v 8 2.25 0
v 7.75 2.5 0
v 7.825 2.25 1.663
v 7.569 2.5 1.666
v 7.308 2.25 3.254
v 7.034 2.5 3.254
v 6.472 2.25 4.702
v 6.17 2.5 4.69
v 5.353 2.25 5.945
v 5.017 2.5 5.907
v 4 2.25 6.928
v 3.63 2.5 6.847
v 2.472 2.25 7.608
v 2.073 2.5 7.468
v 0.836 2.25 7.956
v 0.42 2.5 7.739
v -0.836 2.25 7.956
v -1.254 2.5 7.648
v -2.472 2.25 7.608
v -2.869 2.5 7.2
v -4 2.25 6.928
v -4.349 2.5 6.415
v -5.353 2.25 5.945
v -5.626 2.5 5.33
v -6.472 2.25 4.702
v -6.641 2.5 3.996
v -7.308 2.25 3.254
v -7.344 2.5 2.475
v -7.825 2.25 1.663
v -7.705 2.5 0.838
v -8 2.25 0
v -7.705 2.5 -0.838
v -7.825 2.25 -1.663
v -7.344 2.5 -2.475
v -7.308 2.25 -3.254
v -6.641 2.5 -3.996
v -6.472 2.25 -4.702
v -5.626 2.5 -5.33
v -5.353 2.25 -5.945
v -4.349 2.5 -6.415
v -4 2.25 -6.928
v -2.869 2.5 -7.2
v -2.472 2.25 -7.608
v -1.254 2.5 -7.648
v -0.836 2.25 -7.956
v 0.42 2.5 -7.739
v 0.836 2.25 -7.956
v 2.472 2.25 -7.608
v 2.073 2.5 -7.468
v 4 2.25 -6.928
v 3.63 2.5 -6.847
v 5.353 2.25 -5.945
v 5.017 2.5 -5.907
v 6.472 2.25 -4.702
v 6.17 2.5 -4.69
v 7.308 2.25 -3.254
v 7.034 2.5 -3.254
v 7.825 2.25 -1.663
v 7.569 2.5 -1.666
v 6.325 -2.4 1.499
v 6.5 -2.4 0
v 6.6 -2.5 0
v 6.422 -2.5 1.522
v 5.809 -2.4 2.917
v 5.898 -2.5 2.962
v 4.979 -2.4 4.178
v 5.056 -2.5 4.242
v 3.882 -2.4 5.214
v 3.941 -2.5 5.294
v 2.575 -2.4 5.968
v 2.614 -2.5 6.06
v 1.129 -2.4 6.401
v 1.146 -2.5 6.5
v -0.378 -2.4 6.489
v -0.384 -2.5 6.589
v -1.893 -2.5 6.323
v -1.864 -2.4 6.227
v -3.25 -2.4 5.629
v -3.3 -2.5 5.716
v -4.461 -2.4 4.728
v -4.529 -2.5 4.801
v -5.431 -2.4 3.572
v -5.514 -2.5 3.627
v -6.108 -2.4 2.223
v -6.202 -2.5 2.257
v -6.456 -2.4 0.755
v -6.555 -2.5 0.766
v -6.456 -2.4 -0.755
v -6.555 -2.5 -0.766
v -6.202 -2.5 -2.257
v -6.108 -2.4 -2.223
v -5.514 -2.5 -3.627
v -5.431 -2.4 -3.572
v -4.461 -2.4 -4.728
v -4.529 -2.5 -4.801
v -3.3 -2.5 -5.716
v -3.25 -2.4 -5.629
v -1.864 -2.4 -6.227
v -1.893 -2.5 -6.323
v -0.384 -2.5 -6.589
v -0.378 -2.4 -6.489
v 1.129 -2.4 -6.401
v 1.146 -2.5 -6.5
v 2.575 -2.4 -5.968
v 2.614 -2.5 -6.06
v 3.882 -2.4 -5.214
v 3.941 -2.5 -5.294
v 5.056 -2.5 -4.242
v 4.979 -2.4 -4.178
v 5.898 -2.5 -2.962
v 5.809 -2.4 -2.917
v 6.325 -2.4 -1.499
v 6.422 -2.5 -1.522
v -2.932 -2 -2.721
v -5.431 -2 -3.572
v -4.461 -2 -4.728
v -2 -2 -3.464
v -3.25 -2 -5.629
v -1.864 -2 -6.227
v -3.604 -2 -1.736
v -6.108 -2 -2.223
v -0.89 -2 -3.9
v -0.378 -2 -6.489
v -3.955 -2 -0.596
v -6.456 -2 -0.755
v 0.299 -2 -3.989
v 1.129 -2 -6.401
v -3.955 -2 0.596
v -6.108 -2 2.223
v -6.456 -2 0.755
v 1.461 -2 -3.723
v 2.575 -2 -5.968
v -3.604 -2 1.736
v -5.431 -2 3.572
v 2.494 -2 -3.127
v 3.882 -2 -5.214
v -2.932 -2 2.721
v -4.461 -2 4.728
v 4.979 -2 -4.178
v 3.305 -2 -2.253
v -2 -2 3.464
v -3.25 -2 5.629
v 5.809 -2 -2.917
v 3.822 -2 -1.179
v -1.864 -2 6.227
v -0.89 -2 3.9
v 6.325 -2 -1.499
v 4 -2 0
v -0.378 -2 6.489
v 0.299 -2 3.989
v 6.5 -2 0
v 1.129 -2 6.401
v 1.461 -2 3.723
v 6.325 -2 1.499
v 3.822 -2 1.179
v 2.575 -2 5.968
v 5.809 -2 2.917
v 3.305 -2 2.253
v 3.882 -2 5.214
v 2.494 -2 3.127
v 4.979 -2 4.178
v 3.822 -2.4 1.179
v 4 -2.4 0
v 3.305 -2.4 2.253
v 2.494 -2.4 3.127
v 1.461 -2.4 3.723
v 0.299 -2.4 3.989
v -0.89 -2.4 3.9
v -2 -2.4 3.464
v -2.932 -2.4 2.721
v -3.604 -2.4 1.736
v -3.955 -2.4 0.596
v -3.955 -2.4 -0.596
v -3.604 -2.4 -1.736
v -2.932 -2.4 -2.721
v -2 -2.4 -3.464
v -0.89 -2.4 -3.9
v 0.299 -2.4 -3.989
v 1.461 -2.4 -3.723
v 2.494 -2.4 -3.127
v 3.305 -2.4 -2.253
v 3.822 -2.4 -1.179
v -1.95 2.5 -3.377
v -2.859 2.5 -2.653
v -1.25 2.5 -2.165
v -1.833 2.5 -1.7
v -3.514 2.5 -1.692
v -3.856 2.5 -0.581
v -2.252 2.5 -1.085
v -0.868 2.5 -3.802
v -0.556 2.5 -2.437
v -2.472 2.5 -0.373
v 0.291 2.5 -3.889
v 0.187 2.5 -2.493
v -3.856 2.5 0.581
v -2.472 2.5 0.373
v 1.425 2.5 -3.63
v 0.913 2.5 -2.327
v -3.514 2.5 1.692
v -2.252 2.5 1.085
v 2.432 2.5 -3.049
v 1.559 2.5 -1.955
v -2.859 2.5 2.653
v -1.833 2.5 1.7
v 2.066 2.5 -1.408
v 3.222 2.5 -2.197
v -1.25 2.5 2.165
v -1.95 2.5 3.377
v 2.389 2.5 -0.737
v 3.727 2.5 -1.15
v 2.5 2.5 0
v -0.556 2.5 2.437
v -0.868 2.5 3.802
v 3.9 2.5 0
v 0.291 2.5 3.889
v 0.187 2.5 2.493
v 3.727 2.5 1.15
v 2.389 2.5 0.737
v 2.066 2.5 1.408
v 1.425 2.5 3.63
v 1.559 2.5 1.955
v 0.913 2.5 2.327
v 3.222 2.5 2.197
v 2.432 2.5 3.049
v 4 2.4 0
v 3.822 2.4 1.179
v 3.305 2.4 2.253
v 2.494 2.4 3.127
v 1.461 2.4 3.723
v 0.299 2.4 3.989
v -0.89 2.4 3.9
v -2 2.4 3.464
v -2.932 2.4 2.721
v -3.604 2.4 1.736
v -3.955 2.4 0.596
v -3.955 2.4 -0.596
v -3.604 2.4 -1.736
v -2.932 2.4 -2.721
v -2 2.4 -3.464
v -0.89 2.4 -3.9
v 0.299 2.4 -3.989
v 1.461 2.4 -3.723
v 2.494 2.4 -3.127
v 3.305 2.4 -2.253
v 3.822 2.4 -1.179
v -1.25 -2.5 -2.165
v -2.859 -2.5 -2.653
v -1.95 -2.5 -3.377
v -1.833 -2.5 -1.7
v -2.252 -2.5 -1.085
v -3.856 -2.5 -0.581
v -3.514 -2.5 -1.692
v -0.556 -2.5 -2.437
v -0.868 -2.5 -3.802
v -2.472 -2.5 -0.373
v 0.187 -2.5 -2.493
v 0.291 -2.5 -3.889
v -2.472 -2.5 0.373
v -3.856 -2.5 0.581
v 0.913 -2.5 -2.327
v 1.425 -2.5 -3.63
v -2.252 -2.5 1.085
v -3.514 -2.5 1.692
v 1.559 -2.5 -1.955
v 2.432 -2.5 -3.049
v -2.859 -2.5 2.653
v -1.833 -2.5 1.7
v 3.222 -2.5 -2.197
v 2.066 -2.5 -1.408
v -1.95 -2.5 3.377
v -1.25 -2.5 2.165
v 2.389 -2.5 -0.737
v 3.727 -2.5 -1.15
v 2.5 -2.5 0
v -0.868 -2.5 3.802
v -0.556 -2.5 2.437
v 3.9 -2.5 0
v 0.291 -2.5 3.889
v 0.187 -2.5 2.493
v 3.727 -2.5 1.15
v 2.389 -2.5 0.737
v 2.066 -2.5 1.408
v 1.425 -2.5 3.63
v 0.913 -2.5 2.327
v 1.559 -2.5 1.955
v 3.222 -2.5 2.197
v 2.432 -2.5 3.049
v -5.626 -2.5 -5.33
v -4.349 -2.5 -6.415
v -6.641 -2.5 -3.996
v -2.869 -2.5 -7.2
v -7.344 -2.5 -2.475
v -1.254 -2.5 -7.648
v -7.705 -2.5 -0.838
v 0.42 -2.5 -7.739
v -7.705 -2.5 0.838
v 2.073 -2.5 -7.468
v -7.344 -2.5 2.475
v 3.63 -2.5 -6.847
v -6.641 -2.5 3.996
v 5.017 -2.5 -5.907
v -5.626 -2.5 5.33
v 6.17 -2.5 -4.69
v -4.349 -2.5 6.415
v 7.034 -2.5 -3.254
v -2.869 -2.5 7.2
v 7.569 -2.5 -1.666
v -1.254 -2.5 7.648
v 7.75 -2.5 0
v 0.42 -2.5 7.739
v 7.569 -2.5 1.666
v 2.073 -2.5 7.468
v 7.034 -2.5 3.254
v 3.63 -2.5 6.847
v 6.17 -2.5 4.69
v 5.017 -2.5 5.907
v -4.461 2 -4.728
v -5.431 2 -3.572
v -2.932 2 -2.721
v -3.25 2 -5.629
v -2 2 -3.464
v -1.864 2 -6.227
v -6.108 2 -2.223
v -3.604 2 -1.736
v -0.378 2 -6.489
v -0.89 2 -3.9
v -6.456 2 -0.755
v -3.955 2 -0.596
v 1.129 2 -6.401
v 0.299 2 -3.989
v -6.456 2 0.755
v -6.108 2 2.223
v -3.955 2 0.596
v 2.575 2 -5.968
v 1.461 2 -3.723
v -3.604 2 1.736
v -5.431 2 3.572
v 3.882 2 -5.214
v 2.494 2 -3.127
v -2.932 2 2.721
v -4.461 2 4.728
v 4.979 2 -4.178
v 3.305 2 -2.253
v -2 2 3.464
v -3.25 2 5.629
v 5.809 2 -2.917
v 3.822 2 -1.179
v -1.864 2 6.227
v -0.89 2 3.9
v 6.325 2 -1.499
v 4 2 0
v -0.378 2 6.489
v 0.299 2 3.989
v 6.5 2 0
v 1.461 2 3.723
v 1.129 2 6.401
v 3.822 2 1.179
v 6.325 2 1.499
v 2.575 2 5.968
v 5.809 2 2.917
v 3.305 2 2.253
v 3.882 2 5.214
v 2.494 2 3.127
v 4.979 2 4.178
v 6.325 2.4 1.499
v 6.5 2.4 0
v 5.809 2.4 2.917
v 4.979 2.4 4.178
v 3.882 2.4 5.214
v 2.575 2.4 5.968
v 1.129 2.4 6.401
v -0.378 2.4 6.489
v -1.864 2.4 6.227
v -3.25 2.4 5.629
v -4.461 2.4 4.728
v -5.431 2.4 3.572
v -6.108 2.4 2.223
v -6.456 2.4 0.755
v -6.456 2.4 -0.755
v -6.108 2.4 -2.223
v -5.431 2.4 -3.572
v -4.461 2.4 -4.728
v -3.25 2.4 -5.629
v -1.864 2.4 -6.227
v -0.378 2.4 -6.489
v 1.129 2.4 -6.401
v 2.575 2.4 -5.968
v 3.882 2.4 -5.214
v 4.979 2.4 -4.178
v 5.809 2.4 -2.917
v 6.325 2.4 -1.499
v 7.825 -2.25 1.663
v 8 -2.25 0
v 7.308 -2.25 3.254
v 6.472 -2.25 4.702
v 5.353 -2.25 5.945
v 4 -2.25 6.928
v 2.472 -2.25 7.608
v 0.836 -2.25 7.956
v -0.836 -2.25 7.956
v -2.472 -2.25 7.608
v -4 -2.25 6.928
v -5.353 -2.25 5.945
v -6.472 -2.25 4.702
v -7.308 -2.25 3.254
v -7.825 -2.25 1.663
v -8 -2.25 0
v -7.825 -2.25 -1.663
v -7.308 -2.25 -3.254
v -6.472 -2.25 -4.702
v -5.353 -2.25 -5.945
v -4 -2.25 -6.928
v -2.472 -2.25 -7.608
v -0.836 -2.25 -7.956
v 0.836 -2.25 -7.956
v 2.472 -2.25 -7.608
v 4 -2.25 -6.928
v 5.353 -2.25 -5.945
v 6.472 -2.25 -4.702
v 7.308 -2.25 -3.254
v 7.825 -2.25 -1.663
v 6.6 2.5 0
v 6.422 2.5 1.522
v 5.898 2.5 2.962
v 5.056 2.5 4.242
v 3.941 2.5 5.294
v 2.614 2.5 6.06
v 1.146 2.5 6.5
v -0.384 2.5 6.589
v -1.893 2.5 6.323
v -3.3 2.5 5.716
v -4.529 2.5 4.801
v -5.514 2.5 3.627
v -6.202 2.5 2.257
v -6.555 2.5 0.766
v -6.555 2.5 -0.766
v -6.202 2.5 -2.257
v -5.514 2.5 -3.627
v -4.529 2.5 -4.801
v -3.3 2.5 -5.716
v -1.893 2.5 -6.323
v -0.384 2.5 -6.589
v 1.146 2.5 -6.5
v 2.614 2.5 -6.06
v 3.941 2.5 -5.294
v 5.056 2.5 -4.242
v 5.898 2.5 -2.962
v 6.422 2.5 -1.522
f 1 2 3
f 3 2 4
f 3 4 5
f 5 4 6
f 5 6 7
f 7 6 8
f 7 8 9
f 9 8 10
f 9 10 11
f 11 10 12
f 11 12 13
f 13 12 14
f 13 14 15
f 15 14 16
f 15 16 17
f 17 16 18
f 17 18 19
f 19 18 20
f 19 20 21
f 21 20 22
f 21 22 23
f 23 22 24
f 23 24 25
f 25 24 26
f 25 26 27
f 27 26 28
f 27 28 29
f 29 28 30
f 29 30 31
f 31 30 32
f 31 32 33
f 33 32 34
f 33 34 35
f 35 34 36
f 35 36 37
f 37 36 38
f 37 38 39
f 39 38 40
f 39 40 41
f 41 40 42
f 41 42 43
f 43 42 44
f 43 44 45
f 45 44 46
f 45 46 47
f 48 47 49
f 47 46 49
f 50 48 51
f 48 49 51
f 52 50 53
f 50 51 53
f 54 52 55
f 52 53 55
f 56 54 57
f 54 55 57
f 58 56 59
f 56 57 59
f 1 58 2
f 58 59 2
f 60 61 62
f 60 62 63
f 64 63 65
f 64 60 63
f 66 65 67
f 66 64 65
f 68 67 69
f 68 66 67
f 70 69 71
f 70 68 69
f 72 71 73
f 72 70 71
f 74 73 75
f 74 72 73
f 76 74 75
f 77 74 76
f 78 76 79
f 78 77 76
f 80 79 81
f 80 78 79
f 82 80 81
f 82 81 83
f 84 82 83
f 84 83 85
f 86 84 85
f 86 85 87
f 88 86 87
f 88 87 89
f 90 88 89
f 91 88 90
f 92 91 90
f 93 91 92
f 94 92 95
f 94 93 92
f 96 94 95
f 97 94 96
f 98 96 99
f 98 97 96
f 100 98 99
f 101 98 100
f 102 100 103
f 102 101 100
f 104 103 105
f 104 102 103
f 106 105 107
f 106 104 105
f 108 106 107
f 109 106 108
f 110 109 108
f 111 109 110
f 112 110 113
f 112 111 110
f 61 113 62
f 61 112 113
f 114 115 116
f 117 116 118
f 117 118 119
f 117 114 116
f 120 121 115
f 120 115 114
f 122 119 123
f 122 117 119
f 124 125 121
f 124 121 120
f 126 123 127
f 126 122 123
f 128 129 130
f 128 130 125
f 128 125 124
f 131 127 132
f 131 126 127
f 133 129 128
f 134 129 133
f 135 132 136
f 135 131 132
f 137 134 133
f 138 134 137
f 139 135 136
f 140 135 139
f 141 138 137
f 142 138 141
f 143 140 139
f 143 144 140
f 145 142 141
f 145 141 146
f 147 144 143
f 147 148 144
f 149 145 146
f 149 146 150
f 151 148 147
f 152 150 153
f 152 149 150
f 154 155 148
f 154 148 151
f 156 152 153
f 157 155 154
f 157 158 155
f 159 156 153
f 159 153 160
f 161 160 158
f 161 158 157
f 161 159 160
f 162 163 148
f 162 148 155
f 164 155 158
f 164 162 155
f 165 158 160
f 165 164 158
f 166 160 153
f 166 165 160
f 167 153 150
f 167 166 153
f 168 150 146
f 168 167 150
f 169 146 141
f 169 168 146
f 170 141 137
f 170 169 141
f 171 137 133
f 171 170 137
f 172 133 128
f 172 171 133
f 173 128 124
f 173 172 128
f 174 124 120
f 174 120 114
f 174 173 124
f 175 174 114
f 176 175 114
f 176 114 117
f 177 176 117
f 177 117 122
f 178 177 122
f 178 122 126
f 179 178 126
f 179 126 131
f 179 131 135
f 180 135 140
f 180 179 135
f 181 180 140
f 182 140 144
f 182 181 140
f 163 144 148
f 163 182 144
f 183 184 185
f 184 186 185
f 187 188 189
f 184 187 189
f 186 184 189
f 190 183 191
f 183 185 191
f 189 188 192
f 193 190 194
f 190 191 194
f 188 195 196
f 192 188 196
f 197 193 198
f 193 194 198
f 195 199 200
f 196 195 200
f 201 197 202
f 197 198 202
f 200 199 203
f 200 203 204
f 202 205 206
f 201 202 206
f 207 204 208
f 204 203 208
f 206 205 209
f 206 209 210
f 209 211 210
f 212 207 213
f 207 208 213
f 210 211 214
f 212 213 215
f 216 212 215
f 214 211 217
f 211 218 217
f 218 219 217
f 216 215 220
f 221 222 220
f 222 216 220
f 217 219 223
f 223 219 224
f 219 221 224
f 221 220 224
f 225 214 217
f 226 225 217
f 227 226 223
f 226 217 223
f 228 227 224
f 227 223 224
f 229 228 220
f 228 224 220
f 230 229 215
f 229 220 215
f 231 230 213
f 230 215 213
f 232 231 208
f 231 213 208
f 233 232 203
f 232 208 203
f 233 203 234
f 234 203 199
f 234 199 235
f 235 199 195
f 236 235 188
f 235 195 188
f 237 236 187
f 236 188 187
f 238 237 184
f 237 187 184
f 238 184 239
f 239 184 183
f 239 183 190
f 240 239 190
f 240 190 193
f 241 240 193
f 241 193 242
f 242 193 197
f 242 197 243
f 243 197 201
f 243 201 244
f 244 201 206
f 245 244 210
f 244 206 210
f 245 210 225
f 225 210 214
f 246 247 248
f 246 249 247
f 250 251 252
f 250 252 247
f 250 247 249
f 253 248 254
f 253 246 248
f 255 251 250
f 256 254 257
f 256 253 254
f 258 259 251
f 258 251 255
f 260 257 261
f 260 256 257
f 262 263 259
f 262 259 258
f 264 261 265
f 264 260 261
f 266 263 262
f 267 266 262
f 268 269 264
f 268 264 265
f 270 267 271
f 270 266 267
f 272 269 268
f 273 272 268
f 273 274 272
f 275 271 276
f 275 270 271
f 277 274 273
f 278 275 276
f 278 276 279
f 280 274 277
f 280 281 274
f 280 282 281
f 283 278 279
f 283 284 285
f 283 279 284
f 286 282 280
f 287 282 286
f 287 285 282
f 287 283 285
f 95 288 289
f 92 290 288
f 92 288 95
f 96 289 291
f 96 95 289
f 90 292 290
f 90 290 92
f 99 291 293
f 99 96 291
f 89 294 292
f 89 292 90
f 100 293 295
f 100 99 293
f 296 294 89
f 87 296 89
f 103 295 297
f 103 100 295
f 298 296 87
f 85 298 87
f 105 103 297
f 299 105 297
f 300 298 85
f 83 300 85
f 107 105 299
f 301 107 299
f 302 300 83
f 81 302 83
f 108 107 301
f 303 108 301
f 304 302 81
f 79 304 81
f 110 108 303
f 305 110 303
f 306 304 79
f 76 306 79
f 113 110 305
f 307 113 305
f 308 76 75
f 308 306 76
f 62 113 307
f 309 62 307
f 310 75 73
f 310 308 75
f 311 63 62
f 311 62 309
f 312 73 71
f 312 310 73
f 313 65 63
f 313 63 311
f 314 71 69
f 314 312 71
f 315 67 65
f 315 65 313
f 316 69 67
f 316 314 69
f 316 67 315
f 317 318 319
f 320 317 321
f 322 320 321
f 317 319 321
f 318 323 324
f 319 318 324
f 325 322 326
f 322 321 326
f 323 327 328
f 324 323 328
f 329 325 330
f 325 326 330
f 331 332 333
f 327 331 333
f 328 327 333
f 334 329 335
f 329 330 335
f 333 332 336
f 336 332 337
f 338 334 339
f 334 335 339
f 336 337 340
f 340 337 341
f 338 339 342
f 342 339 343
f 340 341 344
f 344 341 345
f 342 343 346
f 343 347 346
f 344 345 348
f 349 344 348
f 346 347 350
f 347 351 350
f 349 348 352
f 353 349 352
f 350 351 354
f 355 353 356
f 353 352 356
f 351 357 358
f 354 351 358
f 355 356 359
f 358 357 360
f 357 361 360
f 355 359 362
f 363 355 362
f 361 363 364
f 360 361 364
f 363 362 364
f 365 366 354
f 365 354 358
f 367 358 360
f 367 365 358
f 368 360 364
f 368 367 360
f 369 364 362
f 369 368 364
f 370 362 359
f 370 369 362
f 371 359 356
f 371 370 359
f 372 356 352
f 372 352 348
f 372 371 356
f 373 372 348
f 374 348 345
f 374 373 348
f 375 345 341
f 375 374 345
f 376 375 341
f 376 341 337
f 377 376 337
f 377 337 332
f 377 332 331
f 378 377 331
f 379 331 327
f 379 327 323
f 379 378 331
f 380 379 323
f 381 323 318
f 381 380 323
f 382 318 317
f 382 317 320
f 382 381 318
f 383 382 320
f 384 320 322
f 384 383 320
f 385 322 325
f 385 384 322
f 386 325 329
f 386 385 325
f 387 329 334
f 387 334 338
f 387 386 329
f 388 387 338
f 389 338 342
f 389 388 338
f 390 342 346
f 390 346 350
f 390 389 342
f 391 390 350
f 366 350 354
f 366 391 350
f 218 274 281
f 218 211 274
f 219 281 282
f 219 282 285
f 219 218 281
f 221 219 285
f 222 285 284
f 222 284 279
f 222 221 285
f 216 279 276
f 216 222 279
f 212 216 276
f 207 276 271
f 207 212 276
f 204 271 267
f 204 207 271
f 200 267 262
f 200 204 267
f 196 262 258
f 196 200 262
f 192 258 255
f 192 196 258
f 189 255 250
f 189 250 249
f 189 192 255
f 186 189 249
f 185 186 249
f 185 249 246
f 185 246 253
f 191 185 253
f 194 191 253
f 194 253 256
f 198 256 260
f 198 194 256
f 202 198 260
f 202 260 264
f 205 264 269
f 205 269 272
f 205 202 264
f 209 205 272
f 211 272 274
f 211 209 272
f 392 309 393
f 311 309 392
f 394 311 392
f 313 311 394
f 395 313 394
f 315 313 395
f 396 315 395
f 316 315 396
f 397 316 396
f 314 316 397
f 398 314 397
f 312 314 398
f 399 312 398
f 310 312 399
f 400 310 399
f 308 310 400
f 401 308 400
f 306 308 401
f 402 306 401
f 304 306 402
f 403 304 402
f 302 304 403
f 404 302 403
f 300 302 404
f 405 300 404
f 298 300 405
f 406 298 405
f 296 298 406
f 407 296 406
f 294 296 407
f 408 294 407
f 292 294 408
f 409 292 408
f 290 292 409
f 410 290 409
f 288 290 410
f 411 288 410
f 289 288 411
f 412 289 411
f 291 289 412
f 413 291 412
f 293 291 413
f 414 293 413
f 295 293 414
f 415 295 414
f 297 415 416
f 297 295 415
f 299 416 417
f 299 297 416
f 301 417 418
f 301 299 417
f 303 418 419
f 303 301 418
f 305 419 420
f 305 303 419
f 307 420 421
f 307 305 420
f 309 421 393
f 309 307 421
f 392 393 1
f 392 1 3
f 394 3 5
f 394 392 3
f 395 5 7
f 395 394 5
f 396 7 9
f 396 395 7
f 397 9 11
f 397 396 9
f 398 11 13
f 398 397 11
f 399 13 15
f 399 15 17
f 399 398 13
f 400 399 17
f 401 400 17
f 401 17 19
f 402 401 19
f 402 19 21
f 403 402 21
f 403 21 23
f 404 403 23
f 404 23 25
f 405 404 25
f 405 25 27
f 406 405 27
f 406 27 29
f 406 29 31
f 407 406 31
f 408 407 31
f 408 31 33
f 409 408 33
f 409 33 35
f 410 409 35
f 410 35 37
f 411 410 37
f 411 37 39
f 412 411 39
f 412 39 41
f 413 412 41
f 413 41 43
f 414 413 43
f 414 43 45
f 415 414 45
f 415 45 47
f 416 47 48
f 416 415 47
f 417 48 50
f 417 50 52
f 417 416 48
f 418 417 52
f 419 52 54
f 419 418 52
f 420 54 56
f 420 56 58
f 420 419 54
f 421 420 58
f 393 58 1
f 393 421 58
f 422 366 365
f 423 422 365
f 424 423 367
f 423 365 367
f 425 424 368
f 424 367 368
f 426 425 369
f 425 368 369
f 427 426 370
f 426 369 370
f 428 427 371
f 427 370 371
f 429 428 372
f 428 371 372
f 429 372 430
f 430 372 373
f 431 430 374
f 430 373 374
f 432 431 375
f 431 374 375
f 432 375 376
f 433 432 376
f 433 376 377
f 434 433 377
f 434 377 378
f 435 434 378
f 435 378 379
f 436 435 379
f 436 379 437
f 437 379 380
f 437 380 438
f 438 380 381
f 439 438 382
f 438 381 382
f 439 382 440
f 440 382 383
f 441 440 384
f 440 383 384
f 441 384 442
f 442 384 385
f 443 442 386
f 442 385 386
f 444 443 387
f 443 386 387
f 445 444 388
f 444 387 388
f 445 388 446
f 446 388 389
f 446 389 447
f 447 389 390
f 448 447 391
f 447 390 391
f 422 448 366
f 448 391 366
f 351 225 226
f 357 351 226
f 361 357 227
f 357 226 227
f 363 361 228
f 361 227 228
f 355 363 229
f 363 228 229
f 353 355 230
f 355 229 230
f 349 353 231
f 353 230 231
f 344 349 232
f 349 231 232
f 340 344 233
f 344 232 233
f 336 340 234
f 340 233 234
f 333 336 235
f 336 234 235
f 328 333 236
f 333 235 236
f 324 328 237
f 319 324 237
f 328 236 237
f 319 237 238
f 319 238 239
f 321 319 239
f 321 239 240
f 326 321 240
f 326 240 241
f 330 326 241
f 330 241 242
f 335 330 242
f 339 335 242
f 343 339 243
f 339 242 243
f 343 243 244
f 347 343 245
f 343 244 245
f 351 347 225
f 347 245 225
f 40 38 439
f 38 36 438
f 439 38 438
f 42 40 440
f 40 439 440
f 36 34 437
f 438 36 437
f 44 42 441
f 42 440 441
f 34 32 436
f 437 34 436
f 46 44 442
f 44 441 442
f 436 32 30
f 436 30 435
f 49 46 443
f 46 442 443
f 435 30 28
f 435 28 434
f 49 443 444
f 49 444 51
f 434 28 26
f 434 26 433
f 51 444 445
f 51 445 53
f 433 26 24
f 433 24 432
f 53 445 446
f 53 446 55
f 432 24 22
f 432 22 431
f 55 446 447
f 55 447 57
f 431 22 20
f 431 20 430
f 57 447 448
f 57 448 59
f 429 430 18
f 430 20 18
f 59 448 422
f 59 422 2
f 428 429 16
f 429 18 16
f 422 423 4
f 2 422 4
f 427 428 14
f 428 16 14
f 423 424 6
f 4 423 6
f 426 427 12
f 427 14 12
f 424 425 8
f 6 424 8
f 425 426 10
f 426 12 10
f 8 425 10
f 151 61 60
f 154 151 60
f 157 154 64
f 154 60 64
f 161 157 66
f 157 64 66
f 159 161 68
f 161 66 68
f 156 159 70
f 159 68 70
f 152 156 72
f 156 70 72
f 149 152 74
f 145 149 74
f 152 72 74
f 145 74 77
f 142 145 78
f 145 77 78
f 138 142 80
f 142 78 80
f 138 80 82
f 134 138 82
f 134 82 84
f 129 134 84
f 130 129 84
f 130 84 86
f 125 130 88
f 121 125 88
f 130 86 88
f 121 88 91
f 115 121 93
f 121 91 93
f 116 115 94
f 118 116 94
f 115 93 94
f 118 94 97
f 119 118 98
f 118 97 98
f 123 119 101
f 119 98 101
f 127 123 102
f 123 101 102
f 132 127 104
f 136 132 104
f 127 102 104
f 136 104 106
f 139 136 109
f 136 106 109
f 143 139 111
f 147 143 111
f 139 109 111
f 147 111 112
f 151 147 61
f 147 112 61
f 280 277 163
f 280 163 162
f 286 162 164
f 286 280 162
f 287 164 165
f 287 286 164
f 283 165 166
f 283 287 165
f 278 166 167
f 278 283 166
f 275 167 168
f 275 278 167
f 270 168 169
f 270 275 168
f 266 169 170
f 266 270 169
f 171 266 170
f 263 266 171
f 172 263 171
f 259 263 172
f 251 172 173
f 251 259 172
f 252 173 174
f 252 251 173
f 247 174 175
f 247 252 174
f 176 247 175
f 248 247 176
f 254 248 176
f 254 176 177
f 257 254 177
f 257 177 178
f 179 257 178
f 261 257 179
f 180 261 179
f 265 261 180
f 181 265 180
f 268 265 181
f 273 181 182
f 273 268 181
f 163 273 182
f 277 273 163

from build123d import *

# Parameters (mm, degrees)
F0_R     = 8
F0_R_2   = 2.5
F1_DEPTH = 2.5
F2_R     = 6.5
F2_R_2   = 4
F3_DEPTH = 0.5
F4_SIZE  = 0.25
F5_SIZE  = 0.1


# Not quite as in the source:
# - a pattern or mirror of a feature is missing from the dataset's text; its kind, count and spacing are read off the source's solid


with BuildPart() as f1:
    # F0 (on Front) → F1 (new body, symmetric)
    with BuildSketch(Plane.XZ):
        Circle(F0_R)
        Circle(F0_R_2, mode=Mode.SUBTRACT)
    extrude(amount=F1_DEPTH, both=True)

    # F2 (on face) → F3 (cut)
    with BuildSketch(Plane.XZ.offset(2.5)):
        Circle(F2_R)
        Circle(F2_R_2, mode=Mode.SUBTRACT)
    f3 = extrude(amount=-F3_DEPTH, mode=Mode.SUBTRACT)

    # F3_copies: F3 across plane
    add(f3.mirror(Plane.ZX), mode=Mode.SUBTRACT)

    # F4
    f4_edges = [f1.edges().sort_by_distance(p)[0] for p in [
        (-8, -2.5, 0),
        (-8, 2.5, 0),
    ]]
    chamfer(f4_edges, length=F4_SIZE)

    # F5
    f5_edges = [f1.edges().sort_by_distance(p)[0] for p in [
        (-6.5, -2.5, 0),
        (-4, -2.5, 0),
        (-6.5, 2.5, 0),
        (-4, 2.5, 0),
    ]]
    chamfer(f5_edges, length=F5_SIZE)


solid = f1.part
